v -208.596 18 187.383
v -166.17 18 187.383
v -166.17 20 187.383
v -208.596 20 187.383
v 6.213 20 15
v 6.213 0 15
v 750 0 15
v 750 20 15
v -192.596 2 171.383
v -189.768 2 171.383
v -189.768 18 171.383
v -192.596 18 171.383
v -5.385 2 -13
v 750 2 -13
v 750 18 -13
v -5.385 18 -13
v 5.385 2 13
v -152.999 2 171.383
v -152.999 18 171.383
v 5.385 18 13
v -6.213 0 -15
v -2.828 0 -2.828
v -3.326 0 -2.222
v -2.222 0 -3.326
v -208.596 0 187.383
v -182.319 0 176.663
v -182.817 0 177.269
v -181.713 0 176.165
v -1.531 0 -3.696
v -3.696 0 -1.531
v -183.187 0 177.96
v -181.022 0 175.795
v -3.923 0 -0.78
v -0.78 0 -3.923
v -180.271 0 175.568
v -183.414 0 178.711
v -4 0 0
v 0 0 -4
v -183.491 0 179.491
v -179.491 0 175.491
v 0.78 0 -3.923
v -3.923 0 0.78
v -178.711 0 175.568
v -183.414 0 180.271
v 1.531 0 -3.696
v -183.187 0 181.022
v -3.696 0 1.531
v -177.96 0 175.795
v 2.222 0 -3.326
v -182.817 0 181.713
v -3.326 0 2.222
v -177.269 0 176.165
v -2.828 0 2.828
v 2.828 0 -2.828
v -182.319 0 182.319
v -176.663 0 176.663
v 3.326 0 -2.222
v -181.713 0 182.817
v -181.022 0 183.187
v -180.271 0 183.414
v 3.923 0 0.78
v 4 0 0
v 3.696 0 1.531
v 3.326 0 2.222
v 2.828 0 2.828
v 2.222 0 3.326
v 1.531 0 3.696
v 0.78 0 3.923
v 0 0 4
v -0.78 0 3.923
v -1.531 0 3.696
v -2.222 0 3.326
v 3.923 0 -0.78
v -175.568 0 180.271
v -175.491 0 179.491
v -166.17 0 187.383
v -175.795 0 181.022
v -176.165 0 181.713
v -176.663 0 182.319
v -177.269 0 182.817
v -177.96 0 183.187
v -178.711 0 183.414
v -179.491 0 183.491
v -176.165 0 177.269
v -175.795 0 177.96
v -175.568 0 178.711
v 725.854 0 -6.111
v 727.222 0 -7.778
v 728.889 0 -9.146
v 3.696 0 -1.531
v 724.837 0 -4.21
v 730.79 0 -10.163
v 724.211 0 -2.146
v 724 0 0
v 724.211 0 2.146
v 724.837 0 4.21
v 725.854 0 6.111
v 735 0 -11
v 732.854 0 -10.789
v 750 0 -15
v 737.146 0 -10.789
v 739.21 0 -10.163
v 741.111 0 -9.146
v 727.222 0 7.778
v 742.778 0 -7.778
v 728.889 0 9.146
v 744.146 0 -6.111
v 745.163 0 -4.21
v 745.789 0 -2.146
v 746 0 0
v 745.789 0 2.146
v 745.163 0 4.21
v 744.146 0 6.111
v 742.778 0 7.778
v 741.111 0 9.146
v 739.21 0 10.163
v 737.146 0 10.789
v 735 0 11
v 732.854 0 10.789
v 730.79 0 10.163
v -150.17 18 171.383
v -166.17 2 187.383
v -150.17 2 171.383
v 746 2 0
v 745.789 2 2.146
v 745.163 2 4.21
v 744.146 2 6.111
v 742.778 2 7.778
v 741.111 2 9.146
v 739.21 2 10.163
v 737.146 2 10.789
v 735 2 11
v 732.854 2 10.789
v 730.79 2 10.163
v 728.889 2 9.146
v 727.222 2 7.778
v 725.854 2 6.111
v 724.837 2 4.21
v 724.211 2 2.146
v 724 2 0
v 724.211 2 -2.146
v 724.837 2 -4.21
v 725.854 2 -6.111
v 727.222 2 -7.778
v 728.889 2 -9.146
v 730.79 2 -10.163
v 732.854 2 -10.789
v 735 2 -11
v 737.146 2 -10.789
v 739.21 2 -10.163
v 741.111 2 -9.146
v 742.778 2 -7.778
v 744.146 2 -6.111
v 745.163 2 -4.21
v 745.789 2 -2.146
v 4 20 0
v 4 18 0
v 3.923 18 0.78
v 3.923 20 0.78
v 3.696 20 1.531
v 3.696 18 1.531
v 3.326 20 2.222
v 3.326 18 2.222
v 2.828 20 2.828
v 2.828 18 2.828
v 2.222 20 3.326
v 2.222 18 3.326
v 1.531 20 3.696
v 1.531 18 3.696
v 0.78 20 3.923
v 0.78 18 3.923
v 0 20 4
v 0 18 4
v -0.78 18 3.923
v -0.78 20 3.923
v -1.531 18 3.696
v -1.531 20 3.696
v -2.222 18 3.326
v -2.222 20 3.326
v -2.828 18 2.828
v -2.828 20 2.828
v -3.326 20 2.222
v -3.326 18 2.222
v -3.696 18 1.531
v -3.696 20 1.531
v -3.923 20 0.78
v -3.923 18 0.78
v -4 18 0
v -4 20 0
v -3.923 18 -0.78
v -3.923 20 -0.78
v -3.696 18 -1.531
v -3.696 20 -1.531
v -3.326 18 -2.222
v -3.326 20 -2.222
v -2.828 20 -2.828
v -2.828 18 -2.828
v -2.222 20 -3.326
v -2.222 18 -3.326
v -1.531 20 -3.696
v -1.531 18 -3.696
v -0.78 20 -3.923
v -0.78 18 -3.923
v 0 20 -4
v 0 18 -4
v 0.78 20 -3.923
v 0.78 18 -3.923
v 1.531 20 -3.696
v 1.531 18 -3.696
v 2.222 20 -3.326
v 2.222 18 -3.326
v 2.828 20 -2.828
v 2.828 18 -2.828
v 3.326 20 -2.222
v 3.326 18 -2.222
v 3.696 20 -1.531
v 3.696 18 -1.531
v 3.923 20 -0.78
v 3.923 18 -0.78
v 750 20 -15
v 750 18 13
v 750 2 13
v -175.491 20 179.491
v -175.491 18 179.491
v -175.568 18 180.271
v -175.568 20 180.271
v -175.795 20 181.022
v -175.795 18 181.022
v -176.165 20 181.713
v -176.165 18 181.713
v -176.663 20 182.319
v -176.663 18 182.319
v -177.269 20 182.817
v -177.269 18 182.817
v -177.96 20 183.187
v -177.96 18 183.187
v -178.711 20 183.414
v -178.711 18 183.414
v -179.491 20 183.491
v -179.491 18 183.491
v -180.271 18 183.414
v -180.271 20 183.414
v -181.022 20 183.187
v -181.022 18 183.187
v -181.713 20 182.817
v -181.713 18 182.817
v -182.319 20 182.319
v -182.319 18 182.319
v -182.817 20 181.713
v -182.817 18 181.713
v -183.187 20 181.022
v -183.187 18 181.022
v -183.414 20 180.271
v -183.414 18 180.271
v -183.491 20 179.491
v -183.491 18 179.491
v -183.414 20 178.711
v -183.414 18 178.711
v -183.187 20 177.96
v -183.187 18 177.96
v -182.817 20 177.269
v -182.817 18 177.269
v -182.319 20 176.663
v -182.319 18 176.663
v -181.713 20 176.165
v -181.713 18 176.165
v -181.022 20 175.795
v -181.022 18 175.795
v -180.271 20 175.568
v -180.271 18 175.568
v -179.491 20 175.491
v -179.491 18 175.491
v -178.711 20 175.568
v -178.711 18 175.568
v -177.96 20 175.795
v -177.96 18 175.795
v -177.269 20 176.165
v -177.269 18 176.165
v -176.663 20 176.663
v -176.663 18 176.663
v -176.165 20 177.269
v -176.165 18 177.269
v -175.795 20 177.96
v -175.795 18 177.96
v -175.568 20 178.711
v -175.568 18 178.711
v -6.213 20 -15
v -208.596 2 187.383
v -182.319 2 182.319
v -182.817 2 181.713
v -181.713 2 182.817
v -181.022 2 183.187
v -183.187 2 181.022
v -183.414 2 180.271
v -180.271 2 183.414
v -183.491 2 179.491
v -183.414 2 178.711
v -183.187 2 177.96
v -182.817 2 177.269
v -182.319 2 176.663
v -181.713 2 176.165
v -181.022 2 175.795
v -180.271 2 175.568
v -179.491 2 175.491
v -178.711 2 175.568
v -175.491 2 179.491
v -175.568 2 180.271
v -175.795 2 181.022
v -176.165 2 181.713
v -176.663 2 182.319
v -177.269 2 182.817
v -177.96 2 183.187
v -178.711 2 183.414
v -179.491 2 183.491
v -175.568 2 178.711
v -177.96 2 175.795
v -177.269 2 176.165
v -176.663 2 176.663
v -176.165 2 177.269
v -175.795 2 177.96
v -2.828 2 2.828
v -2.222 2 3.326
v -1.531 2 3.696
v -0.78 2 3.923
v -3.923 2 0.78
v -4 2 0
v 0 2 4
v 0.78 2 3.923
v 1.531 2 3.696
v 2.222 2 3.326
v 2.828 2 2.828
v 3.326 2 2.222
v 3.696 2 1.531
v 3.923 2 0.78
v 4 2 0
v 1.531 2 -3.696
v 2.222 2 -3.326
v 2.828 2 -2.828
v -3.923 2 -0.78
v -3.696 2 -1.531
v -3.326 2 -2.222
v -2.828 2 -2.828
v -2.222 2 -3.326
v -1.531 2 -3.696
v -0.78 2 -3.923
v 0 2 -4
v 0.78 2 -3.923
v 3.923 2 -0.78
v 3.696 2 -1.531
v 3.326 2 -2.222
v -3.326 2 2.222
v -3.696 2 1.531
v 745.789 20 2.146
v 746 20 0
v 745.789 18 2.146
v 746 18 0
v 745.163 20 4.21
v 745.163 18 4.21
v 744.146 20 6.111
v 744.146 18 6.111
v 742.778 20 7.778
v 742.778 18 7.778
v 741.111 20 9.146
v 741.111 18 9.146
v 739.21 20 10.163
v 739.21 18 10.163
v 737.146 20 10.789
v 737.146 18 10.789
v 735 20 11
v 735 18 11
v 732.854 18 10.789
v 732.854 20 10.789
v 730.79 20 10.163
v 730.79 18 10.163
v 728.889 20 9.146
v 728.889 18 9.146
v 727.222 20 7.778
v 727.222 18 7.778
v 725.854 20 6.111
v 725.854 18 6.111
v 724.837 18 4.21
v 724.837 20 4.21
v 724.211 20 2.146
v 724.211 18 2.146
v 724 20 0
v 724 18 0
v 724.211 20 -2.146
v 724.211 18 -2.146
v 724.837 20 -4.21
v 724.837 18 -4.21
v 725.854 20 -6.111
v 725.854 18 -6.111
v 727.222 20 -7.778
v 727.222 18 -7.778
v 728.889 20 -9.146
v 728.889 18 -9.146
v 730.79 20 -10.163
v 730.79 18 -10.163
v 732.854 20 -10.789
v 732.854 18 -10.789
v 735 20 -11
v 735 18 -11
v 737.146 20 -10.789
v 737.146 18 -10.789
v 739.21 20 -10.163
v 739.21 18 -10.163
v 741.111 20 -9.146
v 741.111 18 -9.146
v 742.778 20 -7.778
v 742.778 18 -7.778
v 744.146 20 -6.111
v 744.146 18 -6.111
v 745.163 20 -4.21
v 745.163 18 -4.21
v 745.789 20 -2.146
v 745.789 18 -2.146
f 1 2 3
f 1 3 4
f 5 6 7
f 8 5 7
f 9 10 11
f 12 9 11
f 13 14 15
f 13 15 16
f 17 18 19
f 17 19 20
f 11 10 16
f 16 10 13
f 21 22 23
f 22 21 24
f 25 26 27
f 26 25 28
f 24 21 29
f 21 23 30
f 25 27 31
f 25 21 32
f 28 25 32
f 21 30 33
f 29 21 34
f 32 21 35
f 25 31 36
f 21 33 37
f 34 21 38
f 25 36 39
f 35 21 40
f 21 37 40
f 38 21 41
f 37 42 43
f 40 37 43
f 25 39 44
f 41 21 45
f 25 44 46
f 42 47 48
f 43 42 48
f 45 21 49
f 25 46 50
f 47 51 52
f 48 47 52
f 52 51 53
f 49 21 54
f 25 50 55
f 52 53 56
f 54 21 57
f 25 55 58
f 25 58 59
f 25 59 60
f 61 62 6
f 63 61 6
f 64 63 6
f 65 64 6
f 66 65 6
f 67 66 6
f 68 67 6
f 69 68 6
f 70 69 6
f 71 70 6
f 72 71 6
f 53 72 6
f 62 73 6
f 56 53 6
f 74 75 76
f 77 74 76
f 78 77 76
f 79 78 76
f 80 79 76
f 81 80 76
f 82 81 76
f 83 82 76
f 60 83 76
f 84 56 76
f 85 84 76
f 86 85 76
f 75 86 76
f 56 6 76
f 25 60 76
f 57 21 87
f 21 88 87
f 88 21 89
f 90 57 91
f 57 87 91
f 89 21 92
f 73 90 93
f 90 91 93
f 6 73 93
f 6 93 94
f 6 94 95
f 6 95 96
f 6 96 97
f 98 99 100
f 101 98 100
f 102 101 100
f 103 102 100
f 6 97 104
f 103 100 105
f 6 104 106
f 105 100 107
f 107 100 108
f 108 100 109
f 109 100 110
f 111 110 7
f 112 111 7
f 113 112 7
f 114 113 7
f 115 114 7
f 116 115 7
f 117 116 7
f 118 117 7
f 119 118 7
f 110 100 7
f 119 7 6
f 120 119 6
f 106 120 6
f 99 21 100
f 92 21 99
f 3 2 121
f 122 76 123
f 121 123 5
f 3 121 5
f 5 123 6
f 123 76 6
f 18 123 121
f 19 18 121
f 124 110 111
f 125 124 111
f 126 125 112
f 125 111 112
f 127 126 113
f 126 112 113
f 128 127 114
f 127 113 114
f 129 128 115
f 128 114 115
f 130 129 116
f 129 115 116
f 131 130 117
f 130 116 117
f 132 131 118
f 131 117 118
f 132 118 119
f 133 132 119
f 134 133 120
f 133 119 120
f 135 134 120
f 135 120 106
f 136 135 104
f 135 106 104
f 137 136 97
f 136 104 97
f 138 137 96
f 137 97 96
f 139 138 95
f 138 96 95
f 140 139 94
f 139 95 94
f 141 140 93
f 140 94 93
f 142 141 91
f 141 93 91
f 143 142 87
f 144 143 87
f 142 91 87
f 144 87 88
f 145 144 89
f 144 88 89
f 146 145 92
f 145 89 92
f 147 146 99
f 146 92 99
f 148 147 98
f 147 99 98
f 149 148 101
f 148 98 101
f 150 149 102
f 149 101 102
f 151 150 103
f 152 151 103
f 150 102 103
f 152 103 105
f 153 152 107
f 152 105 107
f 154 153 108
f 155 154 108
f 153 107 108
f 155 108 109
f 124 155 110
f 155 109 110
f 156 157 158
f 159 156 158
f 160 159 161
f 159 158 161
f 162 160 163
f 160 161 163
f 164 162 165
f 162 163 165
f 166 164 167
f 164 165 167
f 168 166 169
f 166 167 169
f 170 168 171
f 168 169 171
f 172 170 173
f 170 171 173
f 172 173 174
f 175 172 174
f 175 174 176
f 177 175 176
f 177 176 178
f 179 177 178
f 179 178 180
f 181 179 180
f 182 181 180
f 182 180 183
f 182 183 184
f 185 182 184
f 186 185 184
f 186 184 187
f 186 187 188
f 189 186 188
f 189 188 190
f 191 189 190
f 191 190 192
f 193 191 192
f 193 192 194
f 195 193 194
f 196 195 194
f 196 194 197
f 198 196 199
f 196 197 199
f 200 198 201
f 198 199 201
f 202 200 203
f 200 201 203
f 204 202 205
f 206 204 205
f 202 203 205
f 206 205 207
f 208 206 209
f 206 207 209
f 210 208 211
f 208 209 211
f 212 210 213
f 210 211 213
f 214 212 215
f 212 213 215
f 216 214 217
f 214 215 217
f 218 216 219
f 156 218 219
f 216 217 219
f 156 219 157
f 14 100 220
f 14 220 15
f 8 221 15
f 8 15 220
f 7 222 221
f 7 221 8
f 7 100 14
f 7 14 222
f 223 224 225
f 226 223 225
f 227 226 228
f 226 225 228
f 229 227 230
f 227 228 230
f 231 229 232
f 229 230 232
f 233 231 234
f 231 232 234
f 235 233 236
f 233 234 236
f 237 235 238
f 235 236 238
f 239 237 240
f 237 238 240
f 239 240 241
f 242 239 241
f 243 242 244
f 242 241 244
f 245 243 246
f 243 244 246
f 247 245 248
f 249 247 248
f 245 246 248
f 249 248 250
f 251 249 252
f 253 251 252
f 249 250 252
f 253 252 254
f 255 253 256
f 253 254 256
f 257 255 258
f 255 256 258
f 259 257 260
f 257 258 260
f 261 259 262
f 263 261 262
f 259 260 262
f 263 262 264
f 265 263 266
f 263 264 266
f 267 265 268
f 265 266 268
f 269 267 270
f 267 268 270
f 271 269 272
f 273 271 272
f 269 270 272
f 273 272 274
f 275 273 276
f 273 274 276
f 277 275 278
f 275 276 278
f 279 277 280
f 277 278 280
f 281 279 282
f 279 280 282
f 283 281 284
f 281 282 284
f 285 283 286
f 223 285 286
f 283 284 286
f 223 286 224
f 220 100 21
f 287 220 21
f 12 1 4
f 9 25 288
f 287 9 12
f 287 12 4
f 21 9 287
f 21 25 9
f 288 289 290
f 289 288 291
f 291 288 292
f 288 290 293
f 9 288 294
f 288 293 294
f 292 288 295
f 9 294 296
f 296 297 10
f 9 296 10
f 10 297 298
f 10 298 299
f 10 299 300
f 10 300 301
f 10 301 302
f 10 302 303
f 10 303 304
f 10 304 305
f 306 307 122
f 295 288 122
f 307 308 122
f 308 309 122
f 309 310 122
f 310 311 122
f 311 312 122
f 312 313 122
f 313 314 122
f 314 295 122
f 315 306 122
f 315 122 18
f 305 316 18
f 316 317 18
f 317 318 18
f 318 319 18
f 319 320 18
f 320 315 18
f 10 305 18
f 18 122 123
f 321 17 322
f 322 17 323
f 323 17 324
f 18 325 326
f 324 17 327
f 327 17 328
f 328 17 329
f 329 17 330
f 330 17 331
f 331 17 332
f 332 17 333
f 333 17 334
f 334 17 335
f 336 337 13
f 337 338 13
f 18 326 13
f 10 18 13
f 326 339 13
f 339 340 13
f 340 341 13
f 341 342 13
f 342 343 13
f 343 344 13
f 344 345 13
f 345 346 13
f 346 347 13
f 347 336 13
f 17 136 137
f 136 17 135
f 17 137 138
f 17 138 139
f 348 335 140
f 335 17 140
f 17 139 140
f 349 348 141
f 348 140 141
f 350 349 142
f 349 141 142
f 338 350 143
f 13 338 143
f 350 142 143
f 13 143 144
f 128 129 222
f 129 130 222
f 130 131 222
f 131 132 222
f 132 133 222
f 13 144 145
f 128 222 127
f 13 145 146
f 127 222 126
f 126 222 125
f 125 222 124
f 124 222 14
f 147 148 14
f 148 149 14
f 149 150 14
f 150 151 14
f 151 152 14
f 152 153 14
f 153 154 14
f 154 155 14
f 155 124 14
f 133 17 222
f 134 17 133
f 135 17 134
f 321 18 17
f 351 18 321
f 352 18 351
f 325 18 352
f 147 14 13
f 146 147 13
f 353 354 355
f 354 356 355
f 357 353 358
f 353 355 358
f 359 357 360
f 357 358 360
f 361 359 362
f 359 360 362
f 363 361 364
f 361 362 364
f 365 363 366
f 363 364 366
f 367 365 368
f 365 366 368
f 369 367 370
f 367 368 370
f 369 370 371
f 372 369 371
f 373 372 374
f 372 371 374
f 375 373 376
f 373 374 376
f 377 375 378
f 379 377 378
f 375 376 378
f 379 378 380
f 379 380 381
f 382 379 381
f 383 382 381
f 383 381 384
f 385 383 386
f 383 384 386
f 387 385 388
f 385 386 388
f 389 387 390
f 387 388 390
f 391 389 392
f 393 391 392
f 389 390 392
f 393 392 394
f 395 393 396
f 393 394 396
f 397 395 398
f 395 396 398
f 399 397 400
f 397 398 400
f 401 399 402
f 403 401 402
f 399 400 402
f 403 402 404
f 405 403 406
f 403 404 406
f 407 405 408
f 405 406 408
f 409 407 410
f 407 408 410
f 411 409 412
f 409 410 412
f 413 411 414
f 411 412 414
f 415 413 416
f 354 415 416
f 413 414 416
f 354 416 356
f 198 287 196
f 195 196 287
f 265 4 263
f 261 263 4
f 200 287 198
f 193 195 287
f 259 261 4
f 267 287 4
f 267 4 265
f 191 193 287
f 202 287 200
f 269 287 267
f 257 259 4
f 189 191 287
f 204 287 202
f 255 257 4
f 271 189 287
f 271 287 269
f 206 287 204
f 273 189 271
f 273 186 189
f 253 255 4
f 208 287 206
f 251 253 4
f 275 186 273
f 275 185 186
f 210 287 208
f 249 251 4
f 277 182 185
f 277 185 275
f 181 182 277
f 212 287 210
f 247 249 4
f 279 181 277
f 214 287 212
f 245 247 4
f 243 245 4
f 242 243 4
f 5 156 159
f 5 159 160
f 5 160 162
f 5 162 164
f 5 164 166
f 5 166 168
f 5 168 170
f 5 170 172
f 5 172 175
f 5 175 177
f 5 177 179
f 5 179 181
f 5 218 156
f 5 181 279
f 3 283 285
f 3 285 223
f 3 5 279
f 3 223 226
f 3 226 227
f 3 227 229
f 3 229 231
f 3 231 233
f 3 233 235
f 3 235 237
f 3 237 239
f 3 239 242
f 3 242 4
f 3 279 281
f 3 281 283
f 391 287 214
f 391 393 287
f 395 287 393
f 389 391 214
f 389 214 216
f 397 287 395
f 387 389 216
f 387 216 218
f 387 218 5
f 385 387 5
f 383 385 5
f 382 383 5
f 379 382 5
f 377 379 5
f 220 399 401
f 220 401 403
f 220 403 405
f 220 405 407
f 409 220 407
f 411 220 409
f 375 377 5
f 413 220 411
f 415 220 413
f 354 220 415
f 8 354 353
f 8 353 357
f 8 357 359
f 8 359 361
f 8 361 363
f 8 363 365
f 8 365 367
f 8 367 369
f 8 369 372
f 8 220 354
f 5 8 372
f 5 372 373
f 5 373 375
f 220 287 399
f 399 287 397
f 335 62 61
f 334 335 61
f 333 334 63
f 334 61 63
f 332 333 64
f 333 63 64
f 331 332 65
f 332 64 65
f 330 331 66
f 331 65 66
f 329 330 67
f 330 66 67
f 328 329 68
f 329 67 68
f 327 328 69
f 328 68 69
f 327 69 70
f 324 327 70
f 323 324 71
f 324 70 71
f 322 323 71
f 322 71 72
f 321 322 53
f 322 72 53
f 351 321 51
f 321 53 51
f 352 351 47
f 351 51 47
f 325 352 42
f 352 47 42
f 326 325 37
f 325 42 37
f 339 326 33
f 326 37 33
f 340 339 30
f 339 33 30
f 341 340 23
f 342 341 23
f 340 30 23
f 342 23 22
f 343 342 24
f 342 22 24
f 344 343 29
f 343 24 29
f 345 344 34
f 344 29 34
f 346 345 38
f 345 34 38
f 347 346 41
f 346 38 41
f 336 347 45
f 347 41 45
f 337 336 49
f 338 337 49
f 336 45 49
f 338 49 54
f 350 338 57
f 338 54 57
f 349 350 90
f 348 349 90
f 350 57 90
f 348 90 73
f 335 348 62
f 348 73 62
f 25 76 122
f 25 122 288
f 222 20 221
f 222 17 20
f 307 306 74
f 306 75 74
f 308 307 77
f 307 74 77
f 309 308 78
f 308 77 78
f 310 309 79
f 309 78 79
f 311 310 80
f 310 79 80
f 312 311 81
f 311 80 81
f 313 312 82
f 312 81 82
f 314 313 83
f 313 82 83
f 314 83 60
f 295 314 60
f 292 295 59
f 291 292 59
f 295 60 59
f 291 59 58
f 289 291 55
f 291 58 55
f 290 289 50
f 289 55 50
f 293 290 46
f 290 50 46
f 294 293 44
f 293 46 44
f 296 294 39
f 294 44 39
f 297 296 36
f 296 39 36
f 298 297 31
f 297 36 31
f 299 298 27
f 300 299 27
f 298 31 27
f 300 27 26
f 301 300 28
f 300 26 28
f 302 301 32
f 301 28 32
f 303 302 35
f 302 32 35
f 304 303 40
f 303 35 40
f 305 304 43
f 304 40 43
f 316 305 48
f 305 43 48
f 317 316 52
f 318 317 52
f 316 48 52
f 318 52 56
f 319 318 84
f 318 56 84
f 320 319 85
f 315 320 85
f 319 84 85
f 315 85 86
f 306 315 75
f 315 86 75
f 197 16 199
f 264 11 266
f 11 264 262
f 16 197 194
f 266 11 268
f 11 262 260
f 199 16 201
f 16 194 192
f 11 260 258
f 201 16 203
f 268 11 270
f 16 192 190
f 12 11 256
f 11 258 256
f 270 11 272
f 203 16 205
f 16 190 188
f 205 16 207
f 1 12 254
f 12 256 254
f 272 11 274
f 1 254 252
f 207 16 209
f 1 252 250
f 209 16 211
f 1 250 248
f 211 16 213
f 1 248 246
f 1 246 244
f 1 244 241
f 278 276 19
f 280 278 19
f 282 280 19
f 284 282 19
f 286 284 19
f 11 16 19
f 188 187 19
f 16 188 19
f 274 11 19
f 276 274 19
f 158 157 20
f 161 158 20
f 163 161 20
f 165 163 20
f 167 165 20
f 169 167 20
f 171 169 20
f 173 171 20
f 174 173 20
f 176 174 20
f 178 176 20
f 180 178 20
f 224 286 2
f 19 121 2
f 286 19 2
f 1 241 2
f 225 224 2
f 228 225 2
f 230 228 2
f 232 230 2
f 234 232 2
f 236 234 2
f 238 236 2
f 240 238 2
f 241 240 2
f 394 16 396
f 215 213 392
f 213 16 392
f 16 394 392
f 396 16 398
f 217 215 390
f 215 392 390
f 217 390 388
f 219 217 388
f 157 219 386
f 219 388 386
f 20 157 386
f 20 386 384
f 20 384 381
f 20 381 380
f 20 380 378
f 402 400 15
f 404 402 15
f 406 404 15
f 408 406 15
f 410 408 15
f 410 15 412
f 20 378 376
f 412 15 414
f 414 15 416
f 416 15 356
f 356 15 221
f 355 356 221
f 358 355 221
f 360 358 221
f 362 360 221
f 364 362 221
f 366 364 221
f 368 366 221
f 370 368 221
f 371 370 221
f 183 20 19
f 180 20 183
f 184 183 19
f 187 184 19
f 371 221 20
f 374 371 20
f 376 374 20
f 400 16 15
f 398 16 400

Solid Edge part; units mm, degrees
sketch "Sketch1" plane through (0, 0, 0) normal (0, -1, 0) x (1, 0, 0)
  line L0 (-166.1701, 187.3833) -> (6.2132, 15)
  line L1 (6.2132, 15) -> (750, 15)
  line L2 (750, -15) -> (750, 15)
  line L3 (750, -15) -> (-6.2132, -15)
  line L4 (-208.5965, 187.3833) -> (-6.2132, -15)
  line L5 (-166.1701, 187.3833) -> (-208.5965, 187.3833)
extrude "Protrusion1" add sketch "Sketch1" against normal blind 20
shell "Thinwall_1" thickness 2 removed faces 2 at (750, 16.4667, -10.3) at (-172.8169, 16.4667, 187.3833)
sketch "Sketch2" plane through (0, 0, 0) normal (0, -1, 0) x (1, 0, 0)
  circle A0 centre (-179.491, 179.491) radius 4
extrude "ExtrudedCutout_1" cut sketch "Sketch2" against normal blind 71.5444
sketch "Sketch3" plane through (0, 0, 0) normal (0, -1, 0) x (1, 0, 0)
  circle A0 centre (0, 0) radius 4
extrude "ExtrudedCutout_2" cut sketch "Sketch3" against normal blind 129.6912
sketch "Sketch4" plane through (0, 0, 0) normal (0, -1, 0) x (1, 0, 0)
  circle A0 centre (735, 0) radius 11
extrude "ExtrudedCutout_3" cut sketch "Sketch4" against normal blind 104.4525
sketch "Sketch5" plane through (0, 0, 0) normal (1, 0, 0) x (0, 1, 0)
  line L0 (18, 171.3833) -> (18, 187.3833)
  line L1 (2, 187.3833) -> (18, 187.3833)
  line L2 (2, 187.3833) -> (2, 171.3833)
  line L3 (2, 171.3833) -> (18, 171.3833)
extrude "ExtrudedCutout_4" cut sketch "Sketch5" against normal blind 277.745
